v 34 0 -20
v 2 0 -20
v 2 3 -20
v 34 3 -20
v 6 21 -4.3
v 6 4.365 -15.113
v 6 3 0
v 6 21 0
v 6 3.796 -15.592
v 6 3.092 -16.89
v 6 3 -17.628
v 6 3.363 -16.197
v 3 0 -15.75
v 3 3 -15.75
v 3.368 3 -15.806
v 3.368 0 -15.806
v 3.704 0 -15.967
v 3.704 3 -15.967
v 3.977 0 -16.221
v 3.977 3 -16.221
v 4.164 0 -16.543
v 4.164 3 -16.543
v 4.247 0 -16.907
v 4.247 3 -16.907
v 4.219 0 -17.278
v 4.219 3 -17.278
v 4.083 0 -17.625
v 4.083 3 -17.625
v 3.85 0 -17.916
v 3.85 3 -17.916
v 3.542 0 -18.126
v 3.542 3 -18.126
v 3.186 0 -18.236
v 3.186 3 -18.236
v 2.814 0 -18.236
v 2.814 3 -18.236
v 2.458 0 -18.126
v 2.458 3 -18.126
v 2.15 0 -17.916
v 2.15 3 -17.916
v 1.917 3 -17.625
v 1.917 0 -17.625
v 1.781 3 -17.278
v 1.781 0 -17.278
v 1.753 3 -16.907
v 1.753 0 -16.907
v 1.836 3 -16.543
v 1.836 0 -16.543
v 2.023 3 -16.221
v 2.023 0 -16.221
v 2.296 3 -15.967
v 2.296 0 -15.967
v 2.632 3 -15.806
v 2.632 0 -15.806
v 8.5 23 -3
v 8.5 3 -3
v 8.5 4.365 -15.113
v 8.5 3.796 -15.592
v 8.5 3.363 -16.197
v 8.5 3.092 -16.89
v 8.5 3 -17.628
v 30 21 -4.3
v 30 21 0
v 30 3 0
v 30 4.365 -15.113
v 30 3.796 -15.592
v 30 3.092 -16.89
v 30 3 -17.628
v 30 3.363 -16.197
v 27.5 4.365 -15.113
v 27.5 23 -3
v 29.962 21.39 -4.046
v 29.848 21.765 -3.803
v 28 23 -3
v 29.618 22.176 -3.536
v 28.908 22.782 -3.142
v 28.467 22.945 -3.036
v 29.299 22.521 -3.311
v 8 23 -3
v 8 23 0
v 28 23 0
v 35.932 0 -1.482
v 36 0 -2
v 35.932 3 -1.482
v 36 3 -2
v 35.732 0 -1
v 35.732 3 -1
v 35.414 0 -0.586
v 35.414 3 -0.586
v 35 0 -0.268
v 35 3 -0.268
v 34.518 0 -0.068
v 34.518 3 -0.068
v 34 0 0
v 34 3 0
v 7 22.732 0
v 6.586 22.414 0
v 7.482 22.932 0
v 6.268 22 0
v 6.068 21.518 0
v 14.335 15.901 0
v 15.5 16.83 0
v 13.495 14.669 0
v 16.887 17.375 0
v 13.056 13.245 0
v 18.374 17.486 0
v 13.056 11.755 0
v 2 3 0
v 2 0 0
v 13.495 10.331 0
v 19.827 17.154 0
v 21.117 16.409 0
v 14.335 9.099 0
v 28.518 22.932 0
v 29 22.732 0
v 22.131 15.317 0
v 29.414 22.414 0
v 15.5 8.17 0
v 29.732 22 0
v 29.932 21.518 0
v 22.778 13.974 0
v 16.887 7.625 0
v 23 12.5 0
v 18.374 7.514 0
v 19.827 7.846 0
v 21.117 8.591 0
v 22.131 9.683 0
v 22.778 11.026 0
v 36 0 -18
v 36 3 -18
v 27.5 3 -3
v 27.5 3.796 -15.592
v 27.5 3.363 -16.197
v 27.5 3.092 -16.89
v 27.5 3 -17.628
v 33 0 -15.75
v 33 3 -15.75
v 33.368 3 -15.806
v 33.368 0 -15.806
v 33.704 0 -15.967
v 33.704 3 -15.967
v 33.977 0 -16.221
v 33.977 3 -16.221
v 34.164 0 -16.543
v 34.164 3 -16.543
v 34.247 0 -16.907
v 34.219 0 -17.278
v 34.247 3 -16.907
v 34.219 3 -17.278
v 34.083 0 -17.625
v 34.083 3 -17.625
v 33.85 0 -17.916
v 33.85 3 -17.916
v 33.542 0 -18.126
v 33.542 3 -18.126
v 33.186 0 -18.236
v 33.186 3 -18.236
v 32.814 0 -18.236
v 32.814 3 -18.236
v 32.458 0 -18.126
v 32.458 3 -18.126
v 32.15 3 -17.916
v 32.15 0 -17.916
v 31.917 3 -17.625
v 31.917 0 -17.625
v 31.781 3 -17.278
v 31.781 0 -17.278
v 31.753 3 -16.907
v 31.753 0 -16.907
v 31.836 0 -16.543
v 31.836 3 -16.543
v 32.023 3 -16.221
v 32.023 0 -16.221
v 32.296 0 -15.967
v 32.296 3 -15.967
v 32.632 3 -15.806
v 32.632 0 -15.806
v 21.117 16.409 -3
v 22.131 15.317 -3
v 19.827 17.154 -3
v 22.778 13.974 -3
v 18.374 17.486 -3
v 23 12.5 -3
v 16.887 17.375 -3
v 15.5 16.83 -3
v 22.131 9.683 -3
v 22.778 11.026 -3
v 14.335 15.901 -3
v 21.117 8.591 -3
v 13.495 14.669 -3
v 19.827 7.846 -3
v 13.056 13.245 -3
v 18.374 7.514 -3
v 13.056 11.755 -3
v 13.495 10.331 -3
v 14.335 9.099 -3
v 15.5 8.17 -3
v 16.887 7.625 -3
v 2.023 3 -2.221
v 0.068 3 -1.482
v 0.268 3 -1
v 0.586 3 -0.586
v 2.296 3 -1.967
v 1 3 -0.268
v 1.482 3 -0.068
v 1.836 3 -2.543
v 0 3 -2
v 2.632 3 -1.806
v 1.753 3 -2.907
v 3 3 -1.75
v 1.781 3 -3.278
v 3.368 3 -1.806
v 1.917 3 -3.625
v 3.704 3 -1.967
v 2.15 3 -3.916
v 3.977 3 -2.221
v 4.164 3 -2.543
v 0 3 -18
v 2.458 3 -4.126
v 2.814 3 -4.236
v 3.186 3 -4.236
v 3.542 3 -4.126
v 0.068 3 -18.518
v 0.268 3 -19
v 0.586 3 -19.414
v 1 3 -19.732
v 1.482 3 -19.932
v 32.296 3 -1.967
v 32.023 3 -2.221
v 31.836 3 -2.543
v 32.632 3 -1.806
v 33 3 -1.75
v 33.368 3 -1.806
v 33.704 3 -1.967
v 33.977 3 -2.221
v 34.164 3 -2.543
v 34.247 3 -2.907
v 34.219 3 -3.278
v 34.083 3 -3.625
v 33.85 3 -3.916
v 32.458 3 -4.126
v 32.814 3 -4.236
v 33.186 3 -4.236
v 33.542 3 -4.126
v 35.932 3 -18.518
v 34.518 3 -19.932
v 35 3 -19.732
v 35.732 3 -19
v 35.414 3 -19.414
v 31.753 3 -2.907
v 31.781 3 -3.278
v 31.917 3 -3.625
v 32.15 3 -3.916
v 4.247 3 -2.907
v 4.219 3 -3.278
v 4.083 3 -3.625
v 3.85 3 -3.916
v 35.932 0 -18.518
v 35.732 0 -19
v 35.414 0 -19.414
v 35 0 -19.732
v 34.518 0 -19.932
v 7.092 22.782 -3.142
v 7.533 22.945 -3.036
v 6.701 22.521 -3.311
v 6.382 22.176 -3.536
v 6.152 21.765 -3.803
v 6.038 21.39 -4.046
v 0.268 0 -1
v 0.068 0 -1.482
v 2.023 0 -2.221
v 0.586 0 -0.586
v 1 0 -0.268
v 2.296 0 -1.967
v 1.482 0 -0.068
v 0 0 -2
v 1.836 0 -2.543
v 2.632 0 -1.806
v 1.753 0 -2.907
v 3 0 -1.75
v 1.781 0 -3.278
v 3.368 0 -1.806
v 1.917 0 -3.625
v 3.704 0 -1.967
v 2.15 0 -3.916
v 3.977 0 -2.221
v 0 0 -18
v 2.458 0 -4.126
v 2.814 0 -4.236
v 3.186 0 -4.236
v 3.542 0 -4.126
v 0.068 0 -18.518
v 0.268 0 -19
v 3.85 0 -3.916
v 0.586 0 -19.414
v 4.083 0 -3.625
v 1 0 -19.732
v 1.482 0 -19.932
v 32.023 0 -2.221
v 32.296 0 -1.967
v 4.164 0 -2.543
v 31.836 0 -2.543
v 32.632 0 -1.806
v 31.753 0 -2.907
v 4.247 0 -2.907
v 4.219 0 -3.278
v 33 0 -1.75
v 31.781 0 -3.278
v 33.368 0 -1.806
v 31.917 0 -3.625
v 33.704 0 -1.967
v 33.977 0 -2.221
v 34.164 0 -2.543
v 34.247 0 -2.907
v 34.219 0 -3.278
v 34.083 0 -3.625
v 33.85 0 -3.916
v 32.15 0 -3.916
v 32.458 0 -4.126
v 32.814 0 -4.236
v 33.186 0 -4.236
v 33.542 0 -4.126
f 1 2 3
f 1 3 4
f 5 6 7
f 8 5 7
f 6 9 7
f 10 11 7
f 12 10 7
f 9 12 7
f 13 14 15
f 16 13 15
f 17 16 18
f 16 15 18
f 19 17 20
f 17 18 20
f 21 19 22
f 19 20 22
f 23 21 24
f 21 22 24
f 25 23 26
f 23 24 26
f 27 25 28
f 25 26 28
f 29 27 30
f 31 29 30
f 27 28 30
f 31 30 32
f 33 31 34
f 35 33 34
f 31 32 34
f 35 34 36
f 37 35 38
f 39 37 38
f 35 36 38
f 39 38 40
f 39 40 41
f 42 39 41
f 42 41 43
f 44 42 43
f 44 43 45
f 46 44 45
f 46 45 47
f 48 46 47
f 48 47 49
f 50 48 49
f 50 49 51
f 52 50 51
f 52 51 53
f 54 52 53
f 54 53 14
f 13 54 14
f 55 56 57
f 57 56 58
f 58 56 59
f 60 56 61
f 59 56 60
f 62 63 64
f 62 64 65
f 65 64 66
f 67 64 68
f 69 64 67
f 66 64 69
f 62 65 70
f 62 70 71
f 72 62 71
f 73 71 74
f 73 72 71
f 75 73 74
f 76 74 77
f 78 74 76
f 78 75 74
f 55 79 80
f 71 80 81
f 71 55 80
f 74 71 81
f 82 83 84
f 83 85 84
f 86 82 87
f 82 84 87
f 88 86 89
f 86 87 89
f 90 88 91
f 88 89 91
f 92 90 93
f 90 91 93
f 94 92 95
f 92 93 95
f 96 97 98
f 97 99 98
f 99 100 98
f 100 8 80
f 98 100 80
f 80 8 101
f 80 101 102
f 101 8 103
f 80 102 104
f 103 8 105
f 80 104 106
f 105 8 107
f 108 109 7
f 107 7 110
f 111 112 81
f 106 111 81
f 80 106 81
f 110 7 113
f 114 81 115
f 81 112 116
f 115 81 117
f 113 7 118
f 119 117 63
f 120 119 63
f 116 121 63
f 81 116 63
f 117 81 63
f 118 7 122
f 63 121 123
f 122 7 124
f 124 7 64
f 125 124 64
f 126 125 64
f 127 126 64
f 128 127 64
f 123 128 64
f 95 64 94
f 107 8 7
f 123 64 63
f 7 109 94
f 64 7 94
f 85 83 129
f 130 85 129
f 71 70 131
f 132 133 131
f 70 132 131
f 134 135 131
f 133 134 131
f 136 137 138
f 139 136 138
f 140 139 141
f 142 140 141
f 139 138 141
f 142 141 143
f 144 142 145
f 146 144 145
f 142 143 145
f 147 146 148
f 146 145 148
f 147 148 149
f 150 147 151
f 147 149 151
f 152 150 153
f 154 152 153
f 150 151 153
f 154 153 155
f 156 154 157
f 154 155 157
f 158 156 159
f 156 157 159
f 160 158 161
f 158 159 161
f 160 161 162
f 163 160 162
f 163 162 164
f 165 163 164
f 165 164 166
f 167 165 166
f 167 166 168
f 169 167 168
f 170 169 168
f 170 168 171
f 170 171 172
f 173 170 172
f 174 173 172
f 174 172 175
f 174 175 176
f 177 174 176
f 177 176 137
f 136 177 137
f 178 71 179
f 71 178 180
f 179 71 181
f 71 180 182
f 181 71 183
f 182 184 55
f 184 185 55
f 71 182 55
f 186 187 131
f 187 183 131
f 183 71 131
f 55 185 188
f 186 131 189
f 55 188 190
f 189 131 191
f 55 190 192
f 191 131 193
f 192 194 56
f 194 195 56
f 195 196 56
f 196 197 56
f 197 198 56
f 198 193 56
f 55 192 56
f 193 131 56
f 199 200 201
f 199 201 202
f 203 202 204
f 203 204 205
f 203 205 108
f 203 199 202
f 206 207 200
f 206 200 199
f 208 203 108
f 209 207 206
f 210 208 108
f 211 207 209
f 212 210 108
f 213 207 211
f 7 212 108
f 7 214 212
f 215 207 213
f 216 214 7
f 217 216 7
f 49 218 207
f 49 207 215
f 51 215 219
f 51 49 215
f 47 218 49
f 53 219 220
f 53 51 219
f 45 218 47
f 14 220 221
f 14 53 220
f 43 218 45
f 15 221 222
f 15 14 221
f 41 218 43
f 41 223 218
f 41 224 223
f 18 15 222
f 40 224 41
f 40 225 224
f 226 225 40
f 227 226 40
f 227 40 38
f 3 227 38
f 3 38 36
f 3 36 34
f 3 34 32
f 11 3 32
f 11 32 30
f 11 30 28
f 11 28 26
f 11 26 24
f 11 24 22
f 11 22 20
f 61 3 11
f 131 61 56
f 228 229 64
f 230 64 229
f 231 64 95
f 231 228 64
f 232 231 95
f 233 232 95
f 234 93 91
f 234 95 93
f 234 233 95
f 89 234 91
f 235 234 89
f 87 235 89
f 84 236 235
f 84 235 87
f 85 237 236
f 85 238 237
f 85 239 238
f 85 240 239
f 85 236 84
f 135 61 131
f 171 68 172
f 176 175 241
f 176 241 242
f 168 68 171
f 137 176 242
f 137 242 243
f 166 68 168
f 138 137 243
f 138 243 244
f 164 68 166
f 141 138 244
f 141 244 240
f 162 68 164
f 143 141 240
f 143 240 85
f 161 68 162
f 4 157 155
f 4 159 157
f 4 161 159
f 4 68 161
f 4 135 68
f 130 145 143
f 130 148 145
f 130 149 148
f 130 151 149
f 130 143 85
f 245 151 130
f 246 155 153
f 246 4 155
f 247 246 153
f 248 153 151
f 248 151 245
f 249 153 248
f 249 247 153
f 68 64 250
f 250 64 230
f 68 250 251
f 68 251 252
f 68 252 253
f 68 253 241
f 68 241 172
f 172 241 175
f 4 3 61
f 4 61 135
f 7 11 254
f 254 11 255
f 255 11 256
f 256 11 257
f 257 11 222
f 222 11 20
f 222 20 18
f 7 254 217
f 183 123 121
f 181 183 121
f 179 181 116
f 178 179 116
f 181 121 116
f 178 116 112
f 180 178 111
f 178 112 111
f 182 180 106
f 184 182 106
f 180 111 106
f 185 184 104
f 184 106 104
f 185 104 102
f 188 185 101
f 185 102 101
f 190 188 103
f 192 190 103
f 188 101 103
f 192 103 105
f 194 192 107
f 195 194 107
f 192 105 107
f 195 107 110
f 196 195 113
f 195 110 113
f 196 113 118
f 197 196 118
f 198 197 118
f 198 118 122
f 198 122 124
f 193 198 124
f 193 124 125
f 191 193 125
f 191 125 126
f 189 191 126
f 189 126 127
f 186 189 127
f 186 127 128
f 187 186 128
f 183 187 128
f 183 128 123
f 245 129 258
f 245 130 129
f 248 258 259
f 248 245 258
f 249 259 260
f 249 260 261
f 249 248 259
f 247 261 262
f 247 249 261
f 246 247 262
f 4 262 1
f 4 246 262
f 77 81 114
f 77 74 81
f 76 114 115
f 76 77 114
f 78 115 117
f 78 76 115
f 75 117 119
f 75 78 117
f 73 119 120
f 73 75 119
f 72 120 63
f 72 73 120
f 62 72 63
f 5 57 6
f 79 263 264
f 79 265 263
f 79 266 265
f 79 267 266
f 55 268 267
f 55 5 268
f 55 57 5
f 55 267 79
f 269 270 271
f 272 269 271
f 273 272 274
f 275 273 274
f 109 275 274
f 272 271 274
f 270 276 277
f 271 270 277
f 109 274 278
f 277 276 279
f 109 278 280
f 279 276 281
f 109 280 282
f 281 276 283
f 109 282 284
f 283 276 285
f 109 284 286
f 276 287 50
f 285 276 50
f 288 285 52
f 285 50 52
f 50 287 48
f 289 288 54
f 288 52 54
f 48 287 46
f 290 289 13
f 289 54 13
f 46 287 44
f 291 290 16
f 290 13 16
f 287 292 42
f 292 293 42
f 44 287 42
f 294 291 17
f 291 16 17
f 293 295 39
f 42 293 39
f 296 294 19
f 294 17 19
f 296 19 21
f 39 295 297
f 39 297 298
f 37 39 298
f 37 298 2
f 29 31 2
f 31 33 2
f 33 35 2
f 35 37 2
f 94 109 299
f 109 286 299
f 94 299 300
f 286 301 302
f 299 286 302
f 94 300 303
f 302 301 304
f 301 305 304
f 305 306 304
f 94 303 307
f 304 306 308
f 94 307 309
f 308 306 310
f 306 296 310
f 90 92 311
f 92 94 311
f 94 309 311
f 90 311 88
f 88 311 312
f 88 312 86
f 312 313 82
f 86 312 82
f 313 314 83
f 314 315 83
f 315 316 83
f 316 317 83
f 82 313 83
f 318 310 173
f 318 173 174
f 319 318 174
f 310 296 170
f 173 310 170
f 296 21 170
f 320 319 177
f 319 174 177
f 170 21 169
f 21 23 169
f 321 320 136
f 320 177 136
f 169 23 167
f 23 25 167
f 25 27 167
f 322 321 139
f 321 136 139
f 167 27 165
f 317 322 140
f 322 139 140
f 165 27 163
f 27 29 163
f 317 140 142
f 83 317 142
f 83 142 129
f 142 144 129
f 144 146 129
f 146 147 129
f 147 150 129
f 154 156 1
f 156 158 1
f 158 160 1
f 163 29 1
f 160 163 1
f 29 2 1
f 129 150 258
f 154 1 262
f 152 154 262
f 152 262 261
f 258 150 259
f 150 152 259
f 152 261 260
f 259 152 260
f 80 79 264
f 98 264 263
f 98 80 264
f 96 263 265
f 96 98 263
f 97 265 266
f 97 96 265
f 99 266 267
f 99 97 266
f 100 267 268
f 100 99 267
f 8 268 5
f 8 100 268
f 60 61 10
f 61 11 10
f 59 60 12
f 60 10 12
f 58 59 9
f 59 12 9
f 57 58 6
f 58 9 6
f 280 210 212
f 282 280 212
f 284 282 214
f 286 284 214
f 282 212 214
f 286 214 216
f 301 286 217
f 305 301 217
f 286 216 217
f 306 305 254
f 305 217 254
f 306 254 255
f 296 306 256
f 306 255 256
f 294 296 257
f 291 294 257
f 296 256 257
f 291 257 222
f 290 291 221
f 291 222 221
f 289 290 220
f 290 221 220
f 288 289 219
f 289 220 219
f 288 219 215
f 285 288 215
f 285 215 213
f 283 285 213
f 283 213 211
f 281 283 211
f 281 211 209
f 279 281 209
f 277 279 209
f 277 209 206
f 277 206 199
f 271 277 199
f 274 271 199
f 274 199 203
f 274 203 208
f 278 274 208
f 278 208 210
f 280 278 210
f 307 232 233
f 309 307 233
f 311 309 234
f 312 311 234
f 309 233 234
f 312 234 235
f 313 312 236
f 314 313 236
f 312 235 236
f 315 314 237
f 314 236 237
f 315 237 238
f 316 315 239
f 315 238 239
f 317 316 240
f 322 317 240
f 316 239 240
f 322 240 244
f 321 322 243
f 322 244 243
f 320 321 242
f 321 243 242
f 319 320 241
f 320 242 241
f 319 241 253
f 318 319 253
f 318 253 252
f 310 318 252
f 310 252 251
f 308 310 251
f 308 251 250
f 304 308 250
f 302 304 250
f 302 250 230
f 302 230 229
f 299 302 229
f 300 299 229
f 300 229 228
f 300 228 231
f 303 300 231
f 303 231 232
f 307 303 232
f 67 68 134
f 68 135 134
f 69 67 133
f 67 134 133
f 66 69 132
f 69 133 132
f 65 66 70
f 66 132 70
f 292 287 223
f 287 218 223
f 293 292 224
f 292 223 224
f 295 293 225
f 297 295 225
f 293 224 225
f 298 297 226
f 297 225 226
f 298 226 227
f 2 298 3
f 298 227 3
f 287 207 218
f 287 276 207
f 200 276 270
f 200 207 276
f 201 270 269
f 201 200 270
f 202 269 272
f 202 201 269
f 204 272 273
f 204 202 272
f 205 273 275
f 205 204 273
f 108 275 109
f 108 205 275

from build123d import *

# Parameters (mm, degrees)
SKETCH_1_W          = 36
SKETCH_1_H          = 20
EXTRUDE_1_DEPTH     = 3
SKETCH_6_R          = 1.25
CUT_EXTRUDE_3_DEPTH = 42.291645644
EXTRUDE_2_DEPTH     = 20
CUT_EXTRUDE_1_REACH = 49.17
SKETCH_3_R          = 5
CUT_EXTRUDE_2_DEPTH = 43.766809561
FILLET_1_R          = 2
FILLET_3_R          = 3
FILLET_4_R          = 2


with BuildPart() as part:
    # 草图1 → 凸台-拉伸1 (new body)
    with BuildSketch(Plane(origin=(0, 0, 0), x_dir=(1, 0, 0), z_dir=(0, 1, 0))):
        with Locations((18, 10)):
            Rectangle(SKETCH_1_W, SKETCH_1_H)
    extrude(amount=EXTRUDE_1_DEPTH)

    # 草图6 → 切除-拉伸3 (cut, through all)
    with BuildSketch(Plane(origin=(0, 3, 0), x_dir=(1, 0, 0), z_dir=(0, 1, 0))):
        with Locations(Location((3, 3, 0), (0, 0, 270))):
            Circle(SKETCH_6_R)
        with Locations(Location((3, 17, 0), (0, 0, 270))):
            Circle(SKETCH_6_R)
        with Locations(Location((33, 17, 0), (0, 0, 270))):
            Circle(SKETCH_6_R)
        with Locations(Location((33, 3, 0), (0, 0, 270))):
            Circle(SKETCH_6_R)
    extrude(amount=-CUT_EXTRUDE_3_DEPTH, mode=Mode.SUBTRACT)

    # 草图2 → 凸台-拉伸2 (add)
    with BuildSketch(Plane(origin=(0, 3, 0), x_dir=(1, 0, 0), z_dir=(0, 1, 0))):
        Polygon((6, 0), (30, 0), (30, 16), (27.5, 16), (27.5, 3), (8.5, 3), (8.5, 16), (6, 16), align=None)
    extrude(amount=EXTRUDE_2_DEPTH)

    # 草图3 → 切除-拉伸1 (cut, up to next)
    with BuildSketch(Plane.XY, mode=Mode.PRIVATE) as cut_extrude_1_sk1:
        with Locations((18, 12.5)):
            Circle(SKETCH_3_R)
    cut_extrude_1_tool1 = extrude(cut_extrude_1_sk1.sketch, amount=-CUT_EXTRUDE_1_REACH, mode=Mode.PRIVATE) & part.part
    add(cut_extrude_1_tool1.solids().sort_by_distance((18, 12.5, 0))[0], mode=Mode.SUBTRACT)

    # 草图4 → 切除-拉伸2 (cut, through all)
    with BuildSketch(Plane(origin=(30, 0, 0), x_dir=(0, 0, -1), z_dir=(1, 0, 0))):
        Polygon((3, 23), (16, 23), (16, 3), align=None)
    extrude(amount=-CUT_EXTRUDE_2_DEPTH, mode=Mode.SUBTRACT)

    # 圆角1
    fillet_1_edges = [part.edges().sort_by_distance(p)[0] for p in [
        (0, 1.5, -20),
        (36, 1.5, -20),
        (36, 1.5, 0),
        (0, 1.5, 0),
    ]]
    fillet(fillet_1_edges, radius=FILLET_1_R)

    # 圆角3
    fillet_3_edges = [part.edges().sort_by_distance(p)[0] for p in [
        (28.75, 3, -16),
        (7.25, 3, -16),
    ]]
    fillet(fillet_3_edges, radius=FILLET_3_R)

    # 圆角4
    fillet_4_edges = [part.edges().sort_by_distance(p)[0] for p in [
        (30, 23, -1.5),
        (6, 23, -1.5),
    ]]
    fillet(fillet_4_edges, radius=FILLET_4_R)


solid = part.part
